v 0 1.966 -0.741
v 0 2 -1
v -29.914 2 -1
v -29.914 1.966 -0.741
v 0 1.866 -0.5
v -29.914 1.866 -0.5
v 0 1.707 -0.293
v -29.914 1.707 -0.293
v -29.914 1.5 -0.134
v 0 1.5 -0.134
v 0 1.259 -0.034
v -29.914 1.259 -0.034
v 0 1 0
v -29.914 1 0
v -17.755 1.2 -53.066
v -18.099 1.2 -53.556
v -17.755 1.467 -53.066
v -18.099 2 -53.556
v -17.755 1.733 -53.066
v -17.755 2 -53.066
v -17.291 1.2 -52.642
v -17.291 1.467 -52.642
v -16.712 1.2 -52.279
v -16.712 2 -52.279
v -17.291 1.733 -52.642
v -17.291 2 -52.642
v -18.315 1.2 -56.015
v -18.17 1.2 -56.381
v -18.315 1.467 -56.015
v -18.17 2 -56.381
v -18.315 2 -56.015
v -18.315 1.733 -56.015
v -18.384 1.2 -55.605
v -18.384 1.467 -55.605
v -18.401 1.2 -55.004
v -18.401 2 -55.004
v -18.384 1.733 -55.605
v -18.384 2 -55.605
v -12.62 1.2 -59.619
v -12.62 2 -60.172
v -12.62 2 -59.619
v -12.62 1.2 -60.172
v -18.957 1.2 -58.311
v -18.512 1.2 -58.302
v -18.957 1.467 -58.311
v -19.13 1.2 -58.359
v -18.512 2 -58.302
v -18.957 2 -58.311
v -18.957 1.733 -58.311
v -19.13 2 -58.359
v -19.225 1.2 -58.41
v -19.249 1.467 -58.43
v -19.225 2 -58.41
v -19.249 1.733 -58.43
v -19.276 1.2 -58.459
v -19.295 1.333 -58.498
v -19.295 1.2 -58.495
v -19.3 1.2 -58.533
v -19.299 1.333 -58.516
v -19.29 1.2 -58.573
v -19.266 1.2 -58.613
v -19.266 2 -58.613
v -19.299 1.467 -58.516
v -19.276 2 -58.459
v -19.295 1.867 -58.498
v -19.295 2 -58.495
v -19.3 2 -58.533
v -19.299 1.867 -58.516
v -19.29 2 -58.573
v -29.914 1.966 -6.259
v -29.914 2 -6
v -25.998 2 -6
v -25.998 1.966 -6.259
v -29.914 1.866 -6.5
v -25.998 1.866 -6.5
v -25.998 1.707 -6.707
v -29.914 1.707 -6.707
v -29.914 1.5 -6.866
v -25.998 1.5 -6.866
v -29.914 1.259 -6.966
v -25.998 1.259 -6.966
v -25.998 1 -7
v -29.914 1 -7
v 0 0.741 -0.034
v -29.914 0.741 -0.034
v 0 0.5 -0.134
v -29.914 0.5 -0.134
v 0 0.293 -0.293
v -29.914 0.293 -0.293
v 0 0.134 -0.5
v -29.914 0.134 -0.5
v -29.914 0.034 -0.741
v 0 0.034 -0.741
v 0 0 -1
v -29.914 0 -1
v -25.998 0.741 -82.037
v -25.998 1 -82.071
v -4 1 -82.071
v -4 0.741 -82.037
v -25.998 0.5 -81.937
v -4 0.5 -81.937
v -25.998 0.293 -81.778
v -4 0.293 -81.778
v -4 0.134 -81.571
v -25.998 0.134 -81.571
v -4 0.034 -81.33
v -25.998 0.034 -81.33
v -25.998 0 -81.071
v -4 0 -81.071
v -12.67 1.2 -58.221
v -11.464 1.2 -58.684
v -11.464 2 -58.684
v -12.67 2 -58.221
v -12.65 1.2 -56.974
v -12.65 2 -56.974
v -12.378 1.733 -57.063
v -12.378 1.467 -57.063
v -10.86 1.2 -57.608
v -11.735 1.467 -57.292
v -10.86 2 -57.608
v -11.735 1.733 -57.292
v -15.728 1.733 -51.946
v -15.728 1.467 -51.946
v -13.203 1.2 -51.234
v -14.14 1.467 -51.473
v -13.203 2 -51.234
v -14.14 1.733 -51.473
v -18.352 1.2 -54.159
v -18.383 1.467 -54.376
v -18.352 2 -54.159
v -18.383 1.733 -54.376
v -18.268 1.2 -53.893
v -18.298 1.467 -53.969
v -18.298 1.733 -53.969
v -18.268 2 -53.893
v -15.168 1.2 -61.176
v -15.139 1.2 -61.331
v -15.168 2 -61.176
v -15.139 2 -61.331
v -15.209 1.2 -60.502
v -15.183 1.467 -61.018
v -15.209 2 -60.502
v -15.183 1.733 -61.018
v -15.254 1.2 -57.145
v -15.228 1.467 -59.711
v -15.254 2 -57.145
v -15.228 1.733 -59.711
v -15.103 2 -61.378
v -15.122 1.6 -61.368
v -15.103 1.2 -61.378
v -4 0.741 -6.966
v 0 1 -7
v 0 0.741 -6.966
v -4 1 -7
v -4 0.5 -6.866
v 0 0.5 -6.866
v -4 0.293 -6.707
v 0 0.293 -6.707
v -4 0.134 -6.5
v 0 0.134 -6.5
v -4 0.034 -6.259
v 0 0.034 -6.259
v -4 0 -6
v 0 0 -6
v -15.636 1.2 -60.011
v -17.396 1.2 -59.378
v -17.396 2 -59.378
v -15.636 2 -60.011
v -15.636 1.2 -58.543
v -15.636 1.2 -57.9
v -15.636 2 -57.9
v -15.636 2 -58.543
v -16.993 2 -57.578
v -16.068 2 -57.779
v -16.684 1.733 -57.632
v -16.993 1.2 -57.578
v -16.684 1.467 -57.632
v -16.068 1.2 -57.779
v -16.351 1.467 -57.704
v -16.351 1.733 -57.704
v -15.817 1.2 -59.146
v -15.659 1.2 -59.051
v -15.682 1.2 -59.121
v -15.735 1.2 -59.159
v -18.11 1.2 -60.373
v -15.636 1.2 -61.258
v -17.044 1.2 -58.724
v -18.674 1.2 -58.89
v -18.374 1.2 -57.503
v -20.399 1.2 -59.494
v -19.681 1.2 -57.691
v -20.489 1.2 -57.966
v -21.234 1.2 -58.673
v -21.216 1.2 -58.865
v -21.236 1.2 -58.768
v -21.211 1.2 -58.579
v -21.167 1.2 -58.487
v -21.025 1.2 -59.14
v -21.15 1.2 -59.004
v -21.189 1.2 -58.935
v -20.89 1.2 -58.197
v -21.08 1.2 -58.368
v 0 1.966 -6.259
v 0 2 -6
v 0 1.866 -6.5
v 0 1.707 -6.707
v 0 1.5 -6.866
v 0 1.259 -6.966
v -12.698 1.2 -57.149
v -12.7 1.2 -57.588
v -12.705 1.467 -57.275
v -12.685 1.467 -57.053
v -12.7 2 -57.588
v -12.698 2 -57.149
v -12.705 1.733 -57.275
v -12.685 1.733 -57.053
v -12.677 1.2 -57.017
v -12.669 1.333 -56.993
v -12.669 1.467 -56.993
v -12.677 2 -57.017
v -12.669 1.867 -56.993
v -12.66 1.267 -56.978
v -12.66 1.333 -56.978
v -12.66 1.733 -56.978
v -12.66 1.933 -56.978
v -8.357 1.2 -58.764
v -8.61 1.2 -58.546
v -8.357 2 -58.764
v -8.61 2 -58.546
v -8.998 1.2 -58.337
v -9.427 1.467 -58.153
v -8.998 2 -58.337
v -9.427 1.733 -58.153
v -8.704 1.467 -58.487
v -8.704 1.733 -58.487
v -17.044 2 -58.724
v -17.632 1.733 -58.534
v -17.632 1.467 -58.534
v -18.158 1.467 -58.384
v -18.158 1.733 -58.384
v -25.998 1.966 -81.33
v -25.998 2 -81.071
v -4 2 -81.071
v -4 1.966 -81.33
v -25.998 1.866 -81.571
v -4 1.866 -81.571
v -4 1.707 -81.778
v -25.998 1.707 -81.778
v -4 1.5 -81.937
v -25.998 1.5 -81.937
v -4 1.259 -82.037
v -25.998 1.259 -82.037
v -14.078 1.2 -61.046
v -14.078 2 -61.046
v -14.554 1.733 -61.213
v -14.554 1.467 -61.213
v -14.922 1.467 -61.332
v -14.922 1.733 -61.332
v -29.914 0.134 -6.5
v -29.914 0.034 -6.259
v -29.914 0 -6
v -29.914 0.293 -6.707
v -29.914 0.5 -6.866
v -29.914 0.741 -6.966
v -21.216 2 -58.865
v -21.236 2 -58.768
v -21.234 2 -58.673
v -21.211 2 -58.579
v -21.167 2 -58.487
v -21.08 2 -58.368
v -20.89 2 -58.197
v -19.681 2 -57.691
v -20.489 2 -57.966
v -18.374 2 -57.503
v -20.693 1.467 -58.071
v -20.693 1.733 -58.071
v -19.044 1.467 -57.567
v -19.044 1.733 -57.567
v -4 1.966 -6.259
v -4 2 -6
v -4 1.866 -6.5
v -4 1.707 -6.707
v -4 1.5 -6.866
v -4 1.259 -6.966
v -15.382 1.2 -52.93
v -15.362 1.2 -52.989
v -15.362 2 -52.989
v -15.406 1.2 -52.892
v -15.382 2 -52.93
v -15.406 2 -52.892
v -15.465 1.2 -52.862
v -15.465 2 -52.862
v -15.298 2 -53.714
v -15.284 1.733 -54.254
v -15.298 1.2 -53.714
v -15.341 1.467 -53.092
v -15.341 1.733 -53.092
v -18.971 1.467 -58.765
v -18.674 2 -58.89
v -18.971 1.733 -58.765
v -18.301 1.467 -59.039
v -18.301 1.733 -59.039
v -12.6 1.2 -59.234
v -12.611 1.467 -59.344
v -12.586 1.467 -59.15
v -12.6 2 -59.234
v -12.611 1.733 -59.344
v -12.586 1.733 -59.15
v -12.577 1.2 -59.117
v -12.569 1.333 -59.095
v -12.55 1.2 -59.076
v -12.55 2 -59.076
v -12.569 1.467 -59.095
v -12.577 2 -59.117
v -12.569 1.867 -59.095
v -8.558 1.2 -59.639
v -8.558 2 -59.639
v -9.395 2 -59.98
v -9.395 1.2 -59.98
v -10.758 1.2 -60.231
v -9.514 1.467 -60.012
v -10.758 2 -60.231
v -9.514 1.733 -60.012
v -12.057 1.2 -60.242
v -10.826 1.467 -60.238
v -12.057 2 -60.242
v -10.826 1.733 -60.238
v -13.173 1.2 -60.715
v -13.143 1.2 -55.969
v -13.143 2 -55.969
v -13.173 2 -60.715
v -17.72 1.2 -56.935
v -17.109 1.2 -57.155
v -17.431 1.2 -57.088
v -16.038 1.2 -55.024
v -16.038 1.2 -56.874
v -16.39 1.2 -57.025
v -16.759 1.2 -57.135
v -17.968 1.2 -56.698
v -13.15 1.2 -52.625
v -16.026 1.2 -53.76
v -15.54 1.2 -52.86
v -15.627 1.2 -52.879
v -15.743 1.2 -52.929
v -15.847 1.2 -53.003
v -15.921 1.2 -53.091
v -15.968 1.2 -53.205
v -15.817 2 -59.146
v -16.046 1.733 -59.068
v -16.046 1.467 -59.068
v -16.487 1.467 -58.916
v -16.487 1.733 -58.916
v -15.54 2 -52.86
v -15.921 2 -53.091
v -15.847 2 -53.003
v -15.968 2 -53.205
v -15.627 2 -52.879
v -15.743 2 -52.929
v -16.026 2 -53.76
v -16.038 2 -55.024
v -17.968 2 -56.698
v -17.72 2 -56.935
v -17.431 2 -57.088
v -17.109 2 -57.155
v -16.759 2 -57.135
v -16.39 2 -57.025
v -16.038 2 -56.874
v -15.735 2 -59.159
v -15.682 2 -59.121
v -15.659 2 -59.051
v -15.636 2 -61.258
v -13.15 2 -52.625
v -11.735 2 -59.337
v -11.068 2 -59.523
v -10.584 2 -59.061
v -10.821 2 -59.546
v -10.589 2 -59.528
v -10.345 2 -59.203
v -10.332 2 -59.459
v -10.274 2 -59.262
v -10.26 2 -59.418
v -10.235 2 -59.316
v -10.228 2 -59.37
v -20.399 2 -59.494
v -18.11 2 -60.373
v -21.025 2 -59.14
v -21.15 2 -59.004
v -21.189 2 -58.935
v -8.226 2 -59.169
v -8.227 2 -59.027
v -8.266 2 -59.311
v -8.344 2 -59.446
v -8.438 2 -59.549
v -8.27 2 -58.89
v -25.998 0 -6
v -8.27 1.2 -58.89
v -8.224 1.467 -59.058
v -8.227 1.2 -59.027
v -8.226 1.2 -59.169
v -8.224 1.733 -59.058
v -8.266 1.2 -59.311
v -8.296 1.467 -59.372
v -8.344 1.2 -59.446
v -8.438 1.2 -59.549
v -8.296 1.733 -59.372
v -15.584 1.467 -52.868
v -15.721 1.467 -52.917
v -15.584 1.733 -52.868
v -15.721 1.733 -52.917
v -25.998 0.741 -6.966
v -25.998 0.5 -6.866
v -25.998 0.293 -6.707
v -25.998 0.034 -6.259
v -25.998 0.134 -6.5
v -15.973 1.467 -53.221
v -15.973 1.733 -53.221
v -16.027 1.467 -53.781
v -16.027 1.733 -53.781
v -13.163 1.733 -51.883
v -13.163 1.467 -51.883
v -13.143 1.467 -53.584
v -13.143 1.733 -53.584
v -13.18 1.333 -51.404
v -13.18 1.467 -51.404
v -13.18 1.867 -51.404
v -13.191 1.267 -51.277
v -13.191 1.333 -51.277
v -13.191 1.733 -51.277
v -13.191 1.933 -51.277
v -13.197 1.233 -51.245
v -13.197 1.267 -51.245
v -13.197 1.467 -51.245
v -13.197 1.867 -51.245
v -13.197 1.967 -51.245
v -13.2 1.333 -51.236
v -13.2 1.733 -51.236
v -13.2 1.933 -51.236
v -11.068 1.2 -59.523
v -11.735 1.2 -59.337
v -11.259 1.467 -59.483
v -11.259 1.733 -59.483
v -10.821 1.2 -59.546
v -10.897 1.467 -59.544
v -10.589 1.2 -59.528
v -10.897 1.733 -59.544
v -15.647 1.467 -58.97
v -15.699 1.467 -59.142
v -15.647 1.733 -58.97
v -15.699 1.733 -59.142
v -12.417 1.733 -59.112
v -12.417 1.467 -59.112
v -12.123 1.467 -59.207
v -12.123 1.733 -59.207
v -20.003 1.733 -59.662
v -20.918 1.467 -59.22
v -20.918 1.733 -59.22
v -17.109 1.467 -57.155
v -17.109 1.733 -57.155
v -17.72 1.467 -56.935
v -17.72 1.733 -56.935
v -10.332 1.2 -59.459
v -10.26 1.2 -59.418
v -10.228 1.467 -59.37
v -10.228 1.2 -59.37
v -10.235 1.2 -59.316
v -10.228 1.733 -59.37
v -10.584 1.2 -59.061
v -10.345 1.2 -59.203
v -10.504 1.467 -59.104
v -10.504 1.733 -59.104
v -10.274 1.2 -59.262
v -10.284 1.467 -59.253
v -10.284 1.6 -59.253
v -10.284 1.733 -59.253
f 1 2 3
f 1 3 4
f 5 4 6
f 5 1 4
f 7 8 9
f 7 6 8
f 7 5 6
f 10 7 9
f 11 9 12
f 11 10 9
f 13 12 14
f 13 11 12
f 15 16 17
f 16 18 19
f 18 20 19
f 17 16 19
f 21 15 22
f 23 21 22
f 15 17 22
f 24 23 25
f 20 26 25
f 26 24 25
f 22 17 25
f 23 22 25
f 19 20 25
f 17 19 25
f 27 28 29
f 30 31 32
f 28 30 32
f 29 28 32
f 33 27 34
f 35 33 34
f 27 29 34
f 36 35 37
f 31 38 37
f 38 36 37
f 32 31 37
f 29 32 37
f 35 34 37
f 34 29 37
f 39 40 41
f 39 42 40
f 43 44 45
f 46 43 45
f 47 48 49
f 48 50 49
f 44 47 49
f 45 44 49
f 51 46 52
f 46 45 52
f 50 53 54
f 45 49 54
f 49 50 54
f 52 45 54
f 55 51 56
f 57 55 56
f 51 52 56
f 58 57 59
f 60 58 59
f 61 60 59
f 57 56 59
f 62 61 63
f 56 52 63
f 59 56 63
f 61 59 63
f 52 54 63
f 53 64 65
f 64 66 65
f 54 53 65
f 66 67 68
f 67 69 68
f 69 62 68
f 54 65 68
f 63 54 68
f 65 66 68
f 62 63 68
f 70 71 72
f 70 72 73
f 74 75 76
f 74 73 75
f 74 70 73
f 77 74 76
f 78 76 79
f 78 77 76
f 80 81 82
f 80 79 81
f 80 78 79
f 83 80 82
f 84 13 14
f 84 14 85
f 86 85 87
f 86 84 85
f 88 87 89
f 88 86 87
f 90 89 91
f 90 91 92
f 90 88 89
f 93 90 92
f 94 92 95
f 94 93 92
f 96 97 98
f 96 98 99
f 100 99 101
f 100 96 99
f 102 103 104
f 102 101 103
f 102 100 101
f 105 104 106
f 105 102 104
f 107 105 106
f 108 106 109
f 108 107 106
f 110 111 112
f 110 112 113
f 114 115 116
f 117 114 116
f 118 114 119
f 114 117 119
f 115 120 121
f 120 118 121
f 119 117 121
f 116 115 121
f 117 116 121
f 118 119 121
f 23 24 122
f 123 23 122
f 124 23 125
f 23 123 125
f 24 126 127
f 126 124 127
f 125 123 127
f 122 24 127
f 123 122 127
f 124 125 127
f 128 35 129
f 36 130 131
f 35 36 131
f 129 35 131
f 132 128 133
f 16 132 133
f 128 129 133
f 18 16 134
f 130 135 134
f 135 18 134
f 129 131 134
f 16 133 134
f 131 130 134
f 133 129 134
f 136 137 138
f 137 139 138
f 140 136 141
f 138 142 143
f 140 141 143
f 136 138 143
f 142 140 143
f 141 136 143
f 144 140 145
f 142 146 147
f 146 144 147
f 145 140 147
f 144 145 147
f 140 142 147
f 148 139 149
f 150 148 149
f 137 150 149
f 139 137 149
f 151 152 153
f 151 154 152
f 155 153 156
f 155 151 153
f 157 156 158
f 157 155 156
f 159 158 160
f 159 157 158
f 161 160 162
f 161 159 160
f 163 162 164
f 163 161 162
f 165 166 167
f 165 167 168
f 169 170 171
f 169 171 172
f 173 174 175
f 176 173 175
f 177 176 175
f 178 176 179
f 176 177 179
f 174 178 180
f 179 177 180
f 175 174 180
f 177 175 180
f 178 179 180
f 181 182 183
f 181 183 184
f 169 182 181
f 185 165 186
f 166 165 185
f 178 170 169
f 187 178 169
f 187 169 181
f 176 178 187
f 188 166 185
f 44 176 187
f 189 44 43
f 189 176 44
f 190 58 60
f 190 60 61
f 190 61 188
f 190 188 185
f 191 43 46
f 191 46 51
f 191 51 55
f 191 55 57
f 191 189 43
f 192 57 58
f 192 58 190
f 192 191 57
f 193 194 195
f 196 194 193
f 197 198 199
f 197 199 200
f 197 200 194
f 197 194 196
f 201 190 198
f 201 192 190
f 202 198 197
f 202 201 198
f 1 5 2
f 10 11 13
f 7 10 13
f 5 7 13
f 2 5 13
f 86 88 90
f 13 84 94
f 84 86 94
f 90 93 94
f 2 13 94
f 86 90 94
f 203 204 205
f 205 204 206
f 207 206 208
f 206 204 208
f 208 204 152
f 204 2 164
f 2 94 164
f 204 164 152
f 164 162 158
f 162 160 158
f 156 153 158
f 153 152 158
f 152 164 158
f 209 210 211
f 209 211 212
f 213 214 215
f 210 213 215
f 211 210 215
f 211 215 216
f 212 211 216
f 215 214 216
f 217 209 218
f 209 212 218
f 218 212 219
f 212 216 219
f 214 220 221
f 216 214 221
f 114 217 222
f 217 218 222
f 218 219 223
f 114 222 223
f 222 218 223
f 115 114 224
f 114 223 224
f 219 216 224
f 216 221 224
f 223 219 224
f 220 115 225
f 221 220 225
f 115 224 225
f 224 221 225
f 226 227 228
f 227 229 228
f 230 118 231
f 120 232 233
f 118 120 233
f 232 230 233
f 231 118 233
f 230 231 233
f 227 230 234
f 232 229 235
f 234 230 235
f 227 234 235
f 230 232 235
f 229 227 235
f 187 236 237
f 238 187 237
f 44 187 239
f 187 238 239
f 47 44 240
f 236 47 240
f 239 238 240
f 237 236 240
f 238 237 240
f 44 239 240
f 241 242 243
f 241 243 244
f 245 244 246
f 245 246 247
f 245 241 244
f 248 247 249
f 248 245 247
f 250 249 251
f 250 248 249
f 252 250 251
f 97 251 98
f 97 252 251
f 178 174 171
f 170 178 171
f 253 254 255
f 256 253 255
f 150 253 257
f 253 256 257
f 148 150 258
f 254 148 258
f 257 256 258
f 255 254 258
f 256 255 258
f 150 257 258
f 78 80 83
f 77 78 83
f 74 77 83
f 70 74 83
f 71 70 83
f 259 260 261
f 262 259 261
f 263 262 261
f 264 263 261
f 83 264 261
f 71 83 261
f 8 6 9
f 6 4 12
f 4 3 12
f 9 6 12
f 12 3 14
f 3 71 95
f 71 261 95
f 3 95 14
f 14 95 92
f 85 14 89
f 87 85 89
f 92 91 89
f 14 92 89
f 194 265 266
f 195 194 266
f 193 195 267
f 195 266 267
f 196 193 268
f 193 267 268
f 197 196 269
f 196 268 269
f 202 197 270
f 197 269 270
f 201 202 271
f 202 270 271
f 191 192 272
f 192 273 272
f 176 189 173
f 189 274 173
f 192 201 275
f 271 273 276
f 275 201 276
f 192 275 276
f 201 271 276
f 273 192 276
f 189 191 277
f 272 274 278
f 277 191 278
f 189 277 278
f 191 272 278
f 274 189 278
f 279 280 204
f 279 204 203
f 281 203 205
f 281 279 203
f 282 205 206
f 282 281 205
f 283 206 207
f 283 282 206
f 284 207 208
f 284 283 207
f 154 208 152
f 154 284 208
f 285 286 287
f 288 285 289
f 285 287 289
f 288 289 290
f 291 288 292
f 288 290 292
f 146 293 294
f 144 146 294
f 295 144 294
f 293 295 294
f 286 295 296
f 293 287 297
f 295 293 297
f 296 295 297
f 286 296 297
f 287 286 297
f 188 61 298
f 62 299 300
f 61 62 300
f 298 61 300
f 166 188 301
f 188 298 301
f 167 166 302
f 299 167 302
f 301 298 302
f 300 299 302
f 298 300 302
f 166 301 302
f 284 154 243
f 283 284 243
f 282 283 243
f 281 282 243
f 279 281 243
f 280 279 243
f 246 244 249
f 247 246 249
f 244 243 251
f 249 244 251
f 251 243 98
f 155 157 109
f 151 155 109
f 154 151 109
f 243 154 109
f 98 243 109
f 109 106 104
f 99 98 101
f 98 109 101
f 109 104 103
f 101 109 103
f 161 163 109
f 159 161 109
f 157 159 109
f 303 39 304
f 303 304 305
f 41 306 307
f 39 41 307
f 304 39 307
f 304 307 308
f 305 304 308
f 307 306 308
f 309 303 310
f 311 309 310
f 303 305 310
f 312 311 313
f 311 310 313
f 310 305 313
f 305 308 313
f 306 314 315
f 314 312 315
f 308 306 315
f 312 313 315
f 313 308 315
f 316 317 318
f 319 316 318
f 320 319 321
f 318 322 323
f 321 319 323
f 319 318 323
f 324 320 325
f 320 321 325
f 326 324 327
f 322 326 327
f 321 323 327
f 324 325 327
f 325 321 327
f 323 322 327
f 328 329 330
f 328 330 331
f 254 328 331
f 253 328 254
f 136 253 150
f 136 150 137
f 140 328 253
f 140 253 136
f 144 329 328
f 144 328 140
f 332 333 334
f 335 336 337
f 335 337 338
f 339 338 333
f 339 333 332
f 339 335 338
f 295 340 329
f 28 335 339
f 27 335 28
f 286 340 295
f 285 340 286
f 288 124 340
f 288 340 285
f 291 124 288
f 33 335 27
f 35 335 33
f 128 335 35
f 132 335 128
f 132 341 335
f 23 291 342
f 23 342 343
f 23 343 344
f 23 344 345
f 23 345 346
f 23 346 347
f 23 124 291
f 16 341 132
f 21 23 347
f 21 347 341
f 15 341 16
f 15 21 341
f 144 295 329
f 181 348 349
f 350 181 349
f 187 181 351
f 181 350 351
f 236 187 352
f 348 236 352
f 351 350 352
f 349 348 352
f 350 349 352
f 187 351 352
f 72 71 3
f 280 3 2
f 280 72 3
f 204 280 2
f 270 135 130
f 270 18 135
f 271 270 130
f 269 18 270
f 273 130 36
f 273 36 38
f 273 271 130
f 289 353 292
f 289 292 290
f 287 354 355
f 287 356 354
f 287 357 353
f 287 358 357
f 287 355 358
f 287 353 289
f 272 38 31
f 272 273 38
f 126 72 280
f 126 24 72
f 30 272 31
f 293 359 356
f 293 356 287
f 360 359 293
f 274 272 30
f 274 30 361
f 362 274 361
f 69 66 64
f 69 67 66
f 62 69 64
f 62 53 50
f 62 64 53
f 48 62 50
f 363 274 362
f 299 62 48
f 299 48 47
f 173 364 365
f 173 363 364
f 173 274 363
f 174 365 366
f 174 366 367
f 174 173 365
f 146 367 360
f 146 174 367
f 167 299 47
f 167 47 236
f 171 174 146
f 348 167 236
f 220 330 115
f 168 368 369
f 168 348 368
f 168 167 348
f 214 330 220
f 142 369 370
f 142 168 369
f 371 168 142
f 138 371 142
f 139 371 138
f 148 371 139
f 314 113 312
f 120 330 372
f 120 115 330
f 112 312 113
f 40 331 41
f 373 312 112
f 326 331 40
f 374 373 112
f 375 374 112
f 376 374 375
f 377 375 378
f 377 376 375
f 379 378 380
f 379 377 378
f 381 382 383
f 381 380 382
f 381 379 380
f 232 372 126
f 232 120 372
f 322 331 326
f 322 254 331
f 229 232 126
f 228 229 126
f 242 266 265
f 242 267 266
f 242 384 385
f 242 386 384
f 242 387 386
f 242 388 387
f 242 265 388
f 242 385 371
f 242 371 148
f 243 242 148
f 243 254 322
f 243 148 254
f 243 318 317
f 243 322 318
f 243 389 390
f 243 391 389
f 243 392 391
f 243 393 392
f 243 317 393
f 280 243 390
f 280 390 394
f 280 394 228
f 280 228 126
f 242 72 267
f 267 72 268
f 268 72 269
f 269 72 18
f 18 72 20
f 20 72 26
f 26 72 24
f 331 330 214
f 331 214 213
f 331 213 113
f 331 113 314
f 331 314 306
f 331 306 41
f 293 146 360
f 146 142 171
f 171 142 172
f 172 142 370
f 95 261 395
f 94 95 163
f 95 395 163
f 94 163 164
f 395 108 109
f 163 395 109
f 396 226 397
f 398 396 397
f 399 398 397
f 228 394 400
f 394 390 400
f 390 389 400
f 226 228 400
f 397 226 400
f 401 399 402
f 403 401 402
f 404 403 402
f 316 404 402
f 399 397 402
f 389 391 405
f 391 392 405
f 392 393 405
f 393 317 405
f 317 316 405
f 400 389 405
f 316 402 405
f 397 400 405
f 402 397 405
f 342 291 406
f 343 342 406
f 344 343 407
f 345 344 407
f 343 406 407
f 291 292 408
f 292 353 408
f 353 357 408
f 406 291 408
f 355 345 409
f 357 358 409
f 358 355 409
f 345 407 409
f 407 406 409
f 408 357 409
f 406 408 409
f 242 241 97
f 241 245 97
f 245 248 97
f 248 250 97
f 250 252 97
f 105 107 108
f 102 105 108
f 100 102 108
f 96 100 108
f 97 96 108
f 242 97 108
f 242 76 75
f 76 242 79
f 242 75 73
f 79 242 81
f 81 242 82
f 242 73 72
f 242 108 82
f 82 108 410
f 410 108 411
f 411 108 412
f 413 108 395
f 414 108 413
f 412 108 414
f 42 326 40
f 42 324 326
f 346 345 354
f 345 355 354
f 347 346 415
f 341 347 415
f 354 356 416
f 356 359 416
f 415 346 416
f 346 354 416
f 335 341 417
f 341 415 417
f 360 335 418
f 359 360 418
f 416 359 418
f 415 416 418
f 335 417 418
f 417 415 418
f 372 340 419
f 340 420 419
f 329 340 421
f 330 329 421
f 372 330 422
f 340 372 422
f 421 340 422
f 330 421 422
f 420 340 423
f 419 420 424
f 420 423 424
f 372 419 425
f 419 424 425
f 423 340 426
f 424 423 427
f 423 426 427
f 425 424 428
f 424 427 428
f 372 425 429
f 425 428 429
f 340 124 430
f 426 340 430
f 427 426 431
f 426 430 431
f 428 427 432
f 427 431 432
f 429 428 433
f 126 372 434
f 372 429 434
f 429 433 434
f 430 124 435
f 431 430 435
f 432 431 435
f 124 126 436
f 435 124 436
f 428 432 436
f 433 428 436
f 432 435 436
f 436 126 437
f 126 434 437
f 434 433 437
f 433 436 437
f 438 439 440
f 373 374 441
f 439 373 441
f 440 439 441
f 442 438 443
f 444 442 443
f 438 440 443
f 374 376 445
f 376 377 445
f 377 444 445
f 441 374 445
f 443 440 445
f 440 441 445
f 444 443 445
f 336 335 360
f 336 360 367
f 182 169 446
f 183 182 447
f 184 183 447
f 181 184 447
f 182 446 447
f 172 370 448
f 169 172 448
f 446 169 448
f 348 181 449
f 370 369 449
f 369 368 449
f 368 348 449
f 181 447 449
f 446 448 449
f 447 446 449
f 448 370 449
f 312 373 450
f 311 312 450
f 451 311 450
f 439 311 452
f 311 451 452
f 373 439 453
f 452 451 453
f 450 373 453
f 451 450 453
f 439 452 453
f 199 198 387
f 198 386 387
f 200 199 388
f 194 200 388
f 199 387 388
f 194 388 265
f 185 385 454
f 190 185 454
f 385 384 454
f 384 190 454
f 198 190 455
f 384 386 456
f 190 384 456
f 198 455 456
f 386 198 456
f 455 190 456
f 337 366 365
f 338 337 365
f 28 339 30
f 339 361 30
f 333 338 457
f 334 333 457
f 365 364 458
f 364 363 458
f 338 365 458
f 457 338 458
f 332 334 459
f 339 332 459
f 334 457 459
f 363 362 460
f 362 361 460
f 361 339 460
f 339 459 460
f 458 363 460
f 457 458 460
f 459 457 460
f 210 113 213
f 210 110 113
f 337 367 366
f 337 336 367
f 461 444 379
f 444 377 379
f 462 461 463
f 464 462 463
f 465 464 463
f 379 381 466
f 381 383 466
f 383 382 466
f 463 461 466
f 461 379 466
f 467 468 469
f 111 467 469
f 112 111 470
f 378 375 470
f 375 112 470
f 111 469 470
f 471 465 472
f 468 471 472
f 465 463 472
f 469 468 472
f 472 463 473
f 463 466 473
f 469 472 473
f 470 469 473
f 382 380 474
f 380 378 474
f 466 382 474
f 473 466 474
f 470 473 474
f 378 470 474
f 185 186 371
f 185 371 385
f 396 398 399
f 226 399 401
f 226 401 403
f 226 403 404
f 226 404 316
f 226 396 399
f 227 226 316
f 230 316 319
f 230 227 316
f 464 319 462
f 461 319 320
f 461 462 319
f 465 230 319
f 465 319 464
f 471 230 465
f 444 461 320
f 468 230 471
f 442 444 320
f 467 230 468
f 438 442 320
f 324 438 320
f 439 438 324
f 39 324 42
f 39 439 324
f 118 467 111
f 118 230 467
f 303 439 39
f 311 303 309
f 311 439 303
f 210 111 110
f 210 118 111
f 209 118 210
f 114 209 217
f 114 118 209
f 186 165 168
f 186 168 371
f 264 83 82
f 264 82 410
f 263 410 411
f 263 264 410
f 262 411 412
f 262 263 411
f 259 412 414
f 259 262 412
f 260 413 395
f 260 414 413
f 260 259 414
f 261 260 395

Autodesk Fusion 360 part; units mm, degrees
sketch "Sketch1" plane through (0, 0, 0) normal (0, 1, 0) x (1, 0, 0)
  line L0 (-29.9142, 7) -> (-29.9142, 0)
  line L1 (-29.9142, 0) -> (0, 0)
  line L2 (0, 0) -> (0, 7)
  line L3 (-4, 7) -> (-4, 82.0708)
  line L4 (-4, 82.0708) -> (-25.9976, 82.0708)
  line L5 (-25.9976, 82.0708) -> (-25.9976, 7)
  line L6 (0, 7) -> (-4, 7)
  line L7 (-25.9976, 7) -> (-29.9142, 7)
extrude "Extrude1" add sketch "Sketch1" along normal blind 2
fillet "Fillet1" radius 1 2 edges at (-14.9571, 2, 0) (-14.9571, 0, 0)
fillet "Fillet2" radius 1 2 edges at (-14.9988, 2, -82.0708) (-14.9988, 0, -82.0708)
fillet "Fillet3" radius 1 2 edges at (-2, 0, -7) (-2, 2, -7)
fillet "Fillet4" radius 1 2 edges at (-27.9559, 0, -7) (-27.9559, 2, -7)
sketch "Sketch2" plane through (0, 2, 0) normal (0, 1, 0) x (-1, 0, 0)
  line L0 (25.9976, -6) -> (29.9142, -6)
  line L1 (29.9142, -6) -> (29.9142, -1)
  line L2 (29.9142, -1) -> (0, -1)
  line L3 (0, -1) -> (0, -6)
  line L4 (0, -6) -> (4, -6)
  line L5 (4, -6) -> (4, -81.0708)
  line L6 (4, -81.0708) -> (25.9976, -81.0708)
  line L7 (25.9976, -81.0708) -> (25.9976, -6)
  line L8 (13.1427, -55.9691) -> (13.1729, -60.7147)
  line L9 (13.1729, -60.7147) -> (14.0777, -61.0465)
  spline S0 degree 3 poles (14.0777, -61.0464) (14.5804, -61.2274) (15.0429, -61.3782) (15.1033, -61.3782) knots 0 0 0 0 1 1 1 1
  spline S1 degree 3 poles (15.1033, -61.3782) (15.2038, -61.3883) (15.234, -60.4432) (15.2541, -57.1454) knots 0 0 0 0 1 1 1 1
  spline S2 degree 3 poles (15.2541, -57.1454) (15.2842, -53.1238) (15.2943, -52.8925) (15.4652, -52.8624) knots 0 0 0 0 1 1 1 1
  spline S3 degree 3 poles (15.4652, -52.8624) (15.5657, -52.8422) (15.7367, -52.9026) (15.8473, -53.0031) knots 0 0 0 0 1 1 1 1
  spline S4 degree 3 poles (15.8473, -53.0031) (16.0182, -53.164) (16.0383, -53.3248) (16.0383, -55.024) knots 0 0 0 0 1 1 1 1
  line L10 (16.0383, -55.024) -> (16.0383, -56.874)
  line L11 (16.0383, -56.874) -> (16.3902, -57.0248)
  spline S5 degree 3 poles (16.3902, -57.0248) (17.1443, -57.3365) (17.8179, -57.0952) (18.1698, -56.3813) knots 0 0 0 0 1 1 1 1
  spline S6 degree 3 poles (18.1698, -56.3813) (18.3608, -55.9892) (18.401, -55.7479) (18.401, -55.0039) knots 0 0 0 0 1 1 1 1
  spline S7 degree 3 poles (18.401, -55.0039) (18.401, -54.1895) (18.3709, -54.0488) (18.0994, -53.5561) knots 0 0 0 0 1 1 1 1
  spline S8 degree 3 poles (18.0994, -53.5561) (17.8179, -53.0333) (17.3453, -52.611) (16.7119, -52.2792) knots 0 0 0 0 1 1 1 1
  spline S9 degree 3 poles (16.7119, -52.2792) (16.4505, -52.1385) (13.394, -51.2336) (13.203, -51.2336) knots 0 0 0 0 1 1 1 1
  spline S10 degree 3 poles (13.203, -51.2336) (13.1527, -51.2336) (13.1326, -53.3651) (13.1427, -55.9691) knots 0 0 0 0 1 1 1 1
  spline S11 degree 3 poles (10.8604, -57.6079) (8.9602, -58.3117) (8.6284, -58.4625) (8.3569, -58.7642) knots 0 0 0 0 1 1 1 1
  spline S12 degree 3 poles (8.3569, -58.7642) (8.1156, -59.0256) (8.2061, -59.4177) (8.558, -59.6389) knots 0 0 0 0 1 1 1 1
  spline S13 degree 3 poles (8.558, -59.6389) (9.1914, -60.0611) (11.0112, -60.3728) (12.0568, -60.2421) knots 0 0 0 0 1 1 1 1
  line L12 (12.0568, -60.2421) -> (12.6199, -60.1717)
  line L13 (12.6199, -60.1717) -> (12.6199, -59.6188)
  spline S14 degree 3 poles (12.6199, -59.6188) (12.6199, -59.3171) (12.5897, -59.0758) (12.5495, -59.0758) knots 0 0 0 0 1 1 1 1
  spline S15 degree 3 poles (12.5495, -59.0758) (12.5193, -59.0758) (12.1473, -59.1965) (11.7351, -59.3372) knots 0 0 0 0 1 1 1 1
  spline S16 degree 3 poles (11.7351, -59.3372) (11.1821, -59.5283) (10.8906, -59.5785) (10.5889, -59.5283) knots 0 0 0 0 1 1 1 1
  spline S17 degree 3 poles (10.5889, -59.5283) (9.9254, -59.4076) (10.1466, -59.1965) (11.4636, -58.6837) knots 0 0 0 0 1 1 1 1
  line L14 (11.4636, -58.6837) -> (12.6701, -58.2212)
  line L15 (12.6701, -58.2212) -> (12.7003, -57.5878)
  spline S18 degree 3 poles (12.7003, -57.5878) (12.7204, -57.246) (12.6903, -56.9645) (12.65, -56.9745) knots 0 0 0 0 1 1 1 1
  spline S19 degree 3 poles (12.65, -56.9745) (12.6098, -56.9745) (11.8055, -57.2661) (10.8604, -57.6079) knots 0 0 0 0 1 1 1 1
  spline S20 degree 3 poles (16.9934, -57.5778) (16.722, -57.618) (16.2997, -57.7085) (16.0685, -57.7788) knots 0 0 0 0 1 1 1 1
  line L16 (16.0685, -57.7788) -> (15.6361, -57.8995)
  line L17 (15.6361, -57.8995) -> (15.6361, -58.543)
  spline S21 degree 3 poles (15.6361, -58.543) (15.6361, -59.1261) (15.6562, -59.1965) (15.8171, -59.1462) knots 0 0 0 0 1 1 1 1
  spline S22 degree 3 poles (15.8171, -59.1462) (15.9076, -59.1161) (16.4606, -58.925) (17.0437, -58.7239) knots 0 0 0 0 1 1 1 1
  spline S23 degree 3 poles (17.0437, -58.7239) (17.6269, -58.5229) (18.2804, -58.3419) (18.5116, -58.3017) knots 0 0 0 0 1 1 1 1
  spline S24 degree 3 poles (18.5116, -58.3017) (18.9942, -58.2413) (19.4265, -58.4123) (19.2657, -58.6133) knots 0 0 0 0 1 1 1 1
  spline S25 degree 3 poles (19.2657, -58.6133) (19.2054, -58.6837) (18.3709, -59.0256) (17.3956, -59.3775) knots 0 0 0 0 1 1 1 1
  line L18 (17.3956, -59.3775) -> (15.6361, -60.0109)
  line L19 (15.6361, -60.0109) -> (15.6361, -60.6342)
  line L20 (15.6361, -60.6342) -> (15.6361, -61.2576)
  line L21 (15.6361, -61.2576) -> (18.1095, -60.3728)
  spline S26 degree 3 poles (18.1095, -60.3728) (20.6129, -59.4679) (21.1056, -59.2367) (21.2162, -58.8647) knots 0 0 0 0 1 1 1 1
  spline S27 degree 3 poles (21.2162, -58.8647) (21.4977, -58) (19.0043, -57.2359) (16.9934, -57.5778) knots 0 0 0 0 1 1 1 1
extrude "Extrude2" cut sketch "Sketch2" along normal mid plane 1.6 contours L8 L9 S0 S1 S2 S3 S4 L10 L11 S5 S6 S7 S8 S9 S10 | S11 S12 S13 L12 L13 S14 S15 S16 S17 L14 L15 S18 S19 | S20 L16 L17 S21 S22 S23 S24 S25 L18 L19 L20 L21 S26 S27
